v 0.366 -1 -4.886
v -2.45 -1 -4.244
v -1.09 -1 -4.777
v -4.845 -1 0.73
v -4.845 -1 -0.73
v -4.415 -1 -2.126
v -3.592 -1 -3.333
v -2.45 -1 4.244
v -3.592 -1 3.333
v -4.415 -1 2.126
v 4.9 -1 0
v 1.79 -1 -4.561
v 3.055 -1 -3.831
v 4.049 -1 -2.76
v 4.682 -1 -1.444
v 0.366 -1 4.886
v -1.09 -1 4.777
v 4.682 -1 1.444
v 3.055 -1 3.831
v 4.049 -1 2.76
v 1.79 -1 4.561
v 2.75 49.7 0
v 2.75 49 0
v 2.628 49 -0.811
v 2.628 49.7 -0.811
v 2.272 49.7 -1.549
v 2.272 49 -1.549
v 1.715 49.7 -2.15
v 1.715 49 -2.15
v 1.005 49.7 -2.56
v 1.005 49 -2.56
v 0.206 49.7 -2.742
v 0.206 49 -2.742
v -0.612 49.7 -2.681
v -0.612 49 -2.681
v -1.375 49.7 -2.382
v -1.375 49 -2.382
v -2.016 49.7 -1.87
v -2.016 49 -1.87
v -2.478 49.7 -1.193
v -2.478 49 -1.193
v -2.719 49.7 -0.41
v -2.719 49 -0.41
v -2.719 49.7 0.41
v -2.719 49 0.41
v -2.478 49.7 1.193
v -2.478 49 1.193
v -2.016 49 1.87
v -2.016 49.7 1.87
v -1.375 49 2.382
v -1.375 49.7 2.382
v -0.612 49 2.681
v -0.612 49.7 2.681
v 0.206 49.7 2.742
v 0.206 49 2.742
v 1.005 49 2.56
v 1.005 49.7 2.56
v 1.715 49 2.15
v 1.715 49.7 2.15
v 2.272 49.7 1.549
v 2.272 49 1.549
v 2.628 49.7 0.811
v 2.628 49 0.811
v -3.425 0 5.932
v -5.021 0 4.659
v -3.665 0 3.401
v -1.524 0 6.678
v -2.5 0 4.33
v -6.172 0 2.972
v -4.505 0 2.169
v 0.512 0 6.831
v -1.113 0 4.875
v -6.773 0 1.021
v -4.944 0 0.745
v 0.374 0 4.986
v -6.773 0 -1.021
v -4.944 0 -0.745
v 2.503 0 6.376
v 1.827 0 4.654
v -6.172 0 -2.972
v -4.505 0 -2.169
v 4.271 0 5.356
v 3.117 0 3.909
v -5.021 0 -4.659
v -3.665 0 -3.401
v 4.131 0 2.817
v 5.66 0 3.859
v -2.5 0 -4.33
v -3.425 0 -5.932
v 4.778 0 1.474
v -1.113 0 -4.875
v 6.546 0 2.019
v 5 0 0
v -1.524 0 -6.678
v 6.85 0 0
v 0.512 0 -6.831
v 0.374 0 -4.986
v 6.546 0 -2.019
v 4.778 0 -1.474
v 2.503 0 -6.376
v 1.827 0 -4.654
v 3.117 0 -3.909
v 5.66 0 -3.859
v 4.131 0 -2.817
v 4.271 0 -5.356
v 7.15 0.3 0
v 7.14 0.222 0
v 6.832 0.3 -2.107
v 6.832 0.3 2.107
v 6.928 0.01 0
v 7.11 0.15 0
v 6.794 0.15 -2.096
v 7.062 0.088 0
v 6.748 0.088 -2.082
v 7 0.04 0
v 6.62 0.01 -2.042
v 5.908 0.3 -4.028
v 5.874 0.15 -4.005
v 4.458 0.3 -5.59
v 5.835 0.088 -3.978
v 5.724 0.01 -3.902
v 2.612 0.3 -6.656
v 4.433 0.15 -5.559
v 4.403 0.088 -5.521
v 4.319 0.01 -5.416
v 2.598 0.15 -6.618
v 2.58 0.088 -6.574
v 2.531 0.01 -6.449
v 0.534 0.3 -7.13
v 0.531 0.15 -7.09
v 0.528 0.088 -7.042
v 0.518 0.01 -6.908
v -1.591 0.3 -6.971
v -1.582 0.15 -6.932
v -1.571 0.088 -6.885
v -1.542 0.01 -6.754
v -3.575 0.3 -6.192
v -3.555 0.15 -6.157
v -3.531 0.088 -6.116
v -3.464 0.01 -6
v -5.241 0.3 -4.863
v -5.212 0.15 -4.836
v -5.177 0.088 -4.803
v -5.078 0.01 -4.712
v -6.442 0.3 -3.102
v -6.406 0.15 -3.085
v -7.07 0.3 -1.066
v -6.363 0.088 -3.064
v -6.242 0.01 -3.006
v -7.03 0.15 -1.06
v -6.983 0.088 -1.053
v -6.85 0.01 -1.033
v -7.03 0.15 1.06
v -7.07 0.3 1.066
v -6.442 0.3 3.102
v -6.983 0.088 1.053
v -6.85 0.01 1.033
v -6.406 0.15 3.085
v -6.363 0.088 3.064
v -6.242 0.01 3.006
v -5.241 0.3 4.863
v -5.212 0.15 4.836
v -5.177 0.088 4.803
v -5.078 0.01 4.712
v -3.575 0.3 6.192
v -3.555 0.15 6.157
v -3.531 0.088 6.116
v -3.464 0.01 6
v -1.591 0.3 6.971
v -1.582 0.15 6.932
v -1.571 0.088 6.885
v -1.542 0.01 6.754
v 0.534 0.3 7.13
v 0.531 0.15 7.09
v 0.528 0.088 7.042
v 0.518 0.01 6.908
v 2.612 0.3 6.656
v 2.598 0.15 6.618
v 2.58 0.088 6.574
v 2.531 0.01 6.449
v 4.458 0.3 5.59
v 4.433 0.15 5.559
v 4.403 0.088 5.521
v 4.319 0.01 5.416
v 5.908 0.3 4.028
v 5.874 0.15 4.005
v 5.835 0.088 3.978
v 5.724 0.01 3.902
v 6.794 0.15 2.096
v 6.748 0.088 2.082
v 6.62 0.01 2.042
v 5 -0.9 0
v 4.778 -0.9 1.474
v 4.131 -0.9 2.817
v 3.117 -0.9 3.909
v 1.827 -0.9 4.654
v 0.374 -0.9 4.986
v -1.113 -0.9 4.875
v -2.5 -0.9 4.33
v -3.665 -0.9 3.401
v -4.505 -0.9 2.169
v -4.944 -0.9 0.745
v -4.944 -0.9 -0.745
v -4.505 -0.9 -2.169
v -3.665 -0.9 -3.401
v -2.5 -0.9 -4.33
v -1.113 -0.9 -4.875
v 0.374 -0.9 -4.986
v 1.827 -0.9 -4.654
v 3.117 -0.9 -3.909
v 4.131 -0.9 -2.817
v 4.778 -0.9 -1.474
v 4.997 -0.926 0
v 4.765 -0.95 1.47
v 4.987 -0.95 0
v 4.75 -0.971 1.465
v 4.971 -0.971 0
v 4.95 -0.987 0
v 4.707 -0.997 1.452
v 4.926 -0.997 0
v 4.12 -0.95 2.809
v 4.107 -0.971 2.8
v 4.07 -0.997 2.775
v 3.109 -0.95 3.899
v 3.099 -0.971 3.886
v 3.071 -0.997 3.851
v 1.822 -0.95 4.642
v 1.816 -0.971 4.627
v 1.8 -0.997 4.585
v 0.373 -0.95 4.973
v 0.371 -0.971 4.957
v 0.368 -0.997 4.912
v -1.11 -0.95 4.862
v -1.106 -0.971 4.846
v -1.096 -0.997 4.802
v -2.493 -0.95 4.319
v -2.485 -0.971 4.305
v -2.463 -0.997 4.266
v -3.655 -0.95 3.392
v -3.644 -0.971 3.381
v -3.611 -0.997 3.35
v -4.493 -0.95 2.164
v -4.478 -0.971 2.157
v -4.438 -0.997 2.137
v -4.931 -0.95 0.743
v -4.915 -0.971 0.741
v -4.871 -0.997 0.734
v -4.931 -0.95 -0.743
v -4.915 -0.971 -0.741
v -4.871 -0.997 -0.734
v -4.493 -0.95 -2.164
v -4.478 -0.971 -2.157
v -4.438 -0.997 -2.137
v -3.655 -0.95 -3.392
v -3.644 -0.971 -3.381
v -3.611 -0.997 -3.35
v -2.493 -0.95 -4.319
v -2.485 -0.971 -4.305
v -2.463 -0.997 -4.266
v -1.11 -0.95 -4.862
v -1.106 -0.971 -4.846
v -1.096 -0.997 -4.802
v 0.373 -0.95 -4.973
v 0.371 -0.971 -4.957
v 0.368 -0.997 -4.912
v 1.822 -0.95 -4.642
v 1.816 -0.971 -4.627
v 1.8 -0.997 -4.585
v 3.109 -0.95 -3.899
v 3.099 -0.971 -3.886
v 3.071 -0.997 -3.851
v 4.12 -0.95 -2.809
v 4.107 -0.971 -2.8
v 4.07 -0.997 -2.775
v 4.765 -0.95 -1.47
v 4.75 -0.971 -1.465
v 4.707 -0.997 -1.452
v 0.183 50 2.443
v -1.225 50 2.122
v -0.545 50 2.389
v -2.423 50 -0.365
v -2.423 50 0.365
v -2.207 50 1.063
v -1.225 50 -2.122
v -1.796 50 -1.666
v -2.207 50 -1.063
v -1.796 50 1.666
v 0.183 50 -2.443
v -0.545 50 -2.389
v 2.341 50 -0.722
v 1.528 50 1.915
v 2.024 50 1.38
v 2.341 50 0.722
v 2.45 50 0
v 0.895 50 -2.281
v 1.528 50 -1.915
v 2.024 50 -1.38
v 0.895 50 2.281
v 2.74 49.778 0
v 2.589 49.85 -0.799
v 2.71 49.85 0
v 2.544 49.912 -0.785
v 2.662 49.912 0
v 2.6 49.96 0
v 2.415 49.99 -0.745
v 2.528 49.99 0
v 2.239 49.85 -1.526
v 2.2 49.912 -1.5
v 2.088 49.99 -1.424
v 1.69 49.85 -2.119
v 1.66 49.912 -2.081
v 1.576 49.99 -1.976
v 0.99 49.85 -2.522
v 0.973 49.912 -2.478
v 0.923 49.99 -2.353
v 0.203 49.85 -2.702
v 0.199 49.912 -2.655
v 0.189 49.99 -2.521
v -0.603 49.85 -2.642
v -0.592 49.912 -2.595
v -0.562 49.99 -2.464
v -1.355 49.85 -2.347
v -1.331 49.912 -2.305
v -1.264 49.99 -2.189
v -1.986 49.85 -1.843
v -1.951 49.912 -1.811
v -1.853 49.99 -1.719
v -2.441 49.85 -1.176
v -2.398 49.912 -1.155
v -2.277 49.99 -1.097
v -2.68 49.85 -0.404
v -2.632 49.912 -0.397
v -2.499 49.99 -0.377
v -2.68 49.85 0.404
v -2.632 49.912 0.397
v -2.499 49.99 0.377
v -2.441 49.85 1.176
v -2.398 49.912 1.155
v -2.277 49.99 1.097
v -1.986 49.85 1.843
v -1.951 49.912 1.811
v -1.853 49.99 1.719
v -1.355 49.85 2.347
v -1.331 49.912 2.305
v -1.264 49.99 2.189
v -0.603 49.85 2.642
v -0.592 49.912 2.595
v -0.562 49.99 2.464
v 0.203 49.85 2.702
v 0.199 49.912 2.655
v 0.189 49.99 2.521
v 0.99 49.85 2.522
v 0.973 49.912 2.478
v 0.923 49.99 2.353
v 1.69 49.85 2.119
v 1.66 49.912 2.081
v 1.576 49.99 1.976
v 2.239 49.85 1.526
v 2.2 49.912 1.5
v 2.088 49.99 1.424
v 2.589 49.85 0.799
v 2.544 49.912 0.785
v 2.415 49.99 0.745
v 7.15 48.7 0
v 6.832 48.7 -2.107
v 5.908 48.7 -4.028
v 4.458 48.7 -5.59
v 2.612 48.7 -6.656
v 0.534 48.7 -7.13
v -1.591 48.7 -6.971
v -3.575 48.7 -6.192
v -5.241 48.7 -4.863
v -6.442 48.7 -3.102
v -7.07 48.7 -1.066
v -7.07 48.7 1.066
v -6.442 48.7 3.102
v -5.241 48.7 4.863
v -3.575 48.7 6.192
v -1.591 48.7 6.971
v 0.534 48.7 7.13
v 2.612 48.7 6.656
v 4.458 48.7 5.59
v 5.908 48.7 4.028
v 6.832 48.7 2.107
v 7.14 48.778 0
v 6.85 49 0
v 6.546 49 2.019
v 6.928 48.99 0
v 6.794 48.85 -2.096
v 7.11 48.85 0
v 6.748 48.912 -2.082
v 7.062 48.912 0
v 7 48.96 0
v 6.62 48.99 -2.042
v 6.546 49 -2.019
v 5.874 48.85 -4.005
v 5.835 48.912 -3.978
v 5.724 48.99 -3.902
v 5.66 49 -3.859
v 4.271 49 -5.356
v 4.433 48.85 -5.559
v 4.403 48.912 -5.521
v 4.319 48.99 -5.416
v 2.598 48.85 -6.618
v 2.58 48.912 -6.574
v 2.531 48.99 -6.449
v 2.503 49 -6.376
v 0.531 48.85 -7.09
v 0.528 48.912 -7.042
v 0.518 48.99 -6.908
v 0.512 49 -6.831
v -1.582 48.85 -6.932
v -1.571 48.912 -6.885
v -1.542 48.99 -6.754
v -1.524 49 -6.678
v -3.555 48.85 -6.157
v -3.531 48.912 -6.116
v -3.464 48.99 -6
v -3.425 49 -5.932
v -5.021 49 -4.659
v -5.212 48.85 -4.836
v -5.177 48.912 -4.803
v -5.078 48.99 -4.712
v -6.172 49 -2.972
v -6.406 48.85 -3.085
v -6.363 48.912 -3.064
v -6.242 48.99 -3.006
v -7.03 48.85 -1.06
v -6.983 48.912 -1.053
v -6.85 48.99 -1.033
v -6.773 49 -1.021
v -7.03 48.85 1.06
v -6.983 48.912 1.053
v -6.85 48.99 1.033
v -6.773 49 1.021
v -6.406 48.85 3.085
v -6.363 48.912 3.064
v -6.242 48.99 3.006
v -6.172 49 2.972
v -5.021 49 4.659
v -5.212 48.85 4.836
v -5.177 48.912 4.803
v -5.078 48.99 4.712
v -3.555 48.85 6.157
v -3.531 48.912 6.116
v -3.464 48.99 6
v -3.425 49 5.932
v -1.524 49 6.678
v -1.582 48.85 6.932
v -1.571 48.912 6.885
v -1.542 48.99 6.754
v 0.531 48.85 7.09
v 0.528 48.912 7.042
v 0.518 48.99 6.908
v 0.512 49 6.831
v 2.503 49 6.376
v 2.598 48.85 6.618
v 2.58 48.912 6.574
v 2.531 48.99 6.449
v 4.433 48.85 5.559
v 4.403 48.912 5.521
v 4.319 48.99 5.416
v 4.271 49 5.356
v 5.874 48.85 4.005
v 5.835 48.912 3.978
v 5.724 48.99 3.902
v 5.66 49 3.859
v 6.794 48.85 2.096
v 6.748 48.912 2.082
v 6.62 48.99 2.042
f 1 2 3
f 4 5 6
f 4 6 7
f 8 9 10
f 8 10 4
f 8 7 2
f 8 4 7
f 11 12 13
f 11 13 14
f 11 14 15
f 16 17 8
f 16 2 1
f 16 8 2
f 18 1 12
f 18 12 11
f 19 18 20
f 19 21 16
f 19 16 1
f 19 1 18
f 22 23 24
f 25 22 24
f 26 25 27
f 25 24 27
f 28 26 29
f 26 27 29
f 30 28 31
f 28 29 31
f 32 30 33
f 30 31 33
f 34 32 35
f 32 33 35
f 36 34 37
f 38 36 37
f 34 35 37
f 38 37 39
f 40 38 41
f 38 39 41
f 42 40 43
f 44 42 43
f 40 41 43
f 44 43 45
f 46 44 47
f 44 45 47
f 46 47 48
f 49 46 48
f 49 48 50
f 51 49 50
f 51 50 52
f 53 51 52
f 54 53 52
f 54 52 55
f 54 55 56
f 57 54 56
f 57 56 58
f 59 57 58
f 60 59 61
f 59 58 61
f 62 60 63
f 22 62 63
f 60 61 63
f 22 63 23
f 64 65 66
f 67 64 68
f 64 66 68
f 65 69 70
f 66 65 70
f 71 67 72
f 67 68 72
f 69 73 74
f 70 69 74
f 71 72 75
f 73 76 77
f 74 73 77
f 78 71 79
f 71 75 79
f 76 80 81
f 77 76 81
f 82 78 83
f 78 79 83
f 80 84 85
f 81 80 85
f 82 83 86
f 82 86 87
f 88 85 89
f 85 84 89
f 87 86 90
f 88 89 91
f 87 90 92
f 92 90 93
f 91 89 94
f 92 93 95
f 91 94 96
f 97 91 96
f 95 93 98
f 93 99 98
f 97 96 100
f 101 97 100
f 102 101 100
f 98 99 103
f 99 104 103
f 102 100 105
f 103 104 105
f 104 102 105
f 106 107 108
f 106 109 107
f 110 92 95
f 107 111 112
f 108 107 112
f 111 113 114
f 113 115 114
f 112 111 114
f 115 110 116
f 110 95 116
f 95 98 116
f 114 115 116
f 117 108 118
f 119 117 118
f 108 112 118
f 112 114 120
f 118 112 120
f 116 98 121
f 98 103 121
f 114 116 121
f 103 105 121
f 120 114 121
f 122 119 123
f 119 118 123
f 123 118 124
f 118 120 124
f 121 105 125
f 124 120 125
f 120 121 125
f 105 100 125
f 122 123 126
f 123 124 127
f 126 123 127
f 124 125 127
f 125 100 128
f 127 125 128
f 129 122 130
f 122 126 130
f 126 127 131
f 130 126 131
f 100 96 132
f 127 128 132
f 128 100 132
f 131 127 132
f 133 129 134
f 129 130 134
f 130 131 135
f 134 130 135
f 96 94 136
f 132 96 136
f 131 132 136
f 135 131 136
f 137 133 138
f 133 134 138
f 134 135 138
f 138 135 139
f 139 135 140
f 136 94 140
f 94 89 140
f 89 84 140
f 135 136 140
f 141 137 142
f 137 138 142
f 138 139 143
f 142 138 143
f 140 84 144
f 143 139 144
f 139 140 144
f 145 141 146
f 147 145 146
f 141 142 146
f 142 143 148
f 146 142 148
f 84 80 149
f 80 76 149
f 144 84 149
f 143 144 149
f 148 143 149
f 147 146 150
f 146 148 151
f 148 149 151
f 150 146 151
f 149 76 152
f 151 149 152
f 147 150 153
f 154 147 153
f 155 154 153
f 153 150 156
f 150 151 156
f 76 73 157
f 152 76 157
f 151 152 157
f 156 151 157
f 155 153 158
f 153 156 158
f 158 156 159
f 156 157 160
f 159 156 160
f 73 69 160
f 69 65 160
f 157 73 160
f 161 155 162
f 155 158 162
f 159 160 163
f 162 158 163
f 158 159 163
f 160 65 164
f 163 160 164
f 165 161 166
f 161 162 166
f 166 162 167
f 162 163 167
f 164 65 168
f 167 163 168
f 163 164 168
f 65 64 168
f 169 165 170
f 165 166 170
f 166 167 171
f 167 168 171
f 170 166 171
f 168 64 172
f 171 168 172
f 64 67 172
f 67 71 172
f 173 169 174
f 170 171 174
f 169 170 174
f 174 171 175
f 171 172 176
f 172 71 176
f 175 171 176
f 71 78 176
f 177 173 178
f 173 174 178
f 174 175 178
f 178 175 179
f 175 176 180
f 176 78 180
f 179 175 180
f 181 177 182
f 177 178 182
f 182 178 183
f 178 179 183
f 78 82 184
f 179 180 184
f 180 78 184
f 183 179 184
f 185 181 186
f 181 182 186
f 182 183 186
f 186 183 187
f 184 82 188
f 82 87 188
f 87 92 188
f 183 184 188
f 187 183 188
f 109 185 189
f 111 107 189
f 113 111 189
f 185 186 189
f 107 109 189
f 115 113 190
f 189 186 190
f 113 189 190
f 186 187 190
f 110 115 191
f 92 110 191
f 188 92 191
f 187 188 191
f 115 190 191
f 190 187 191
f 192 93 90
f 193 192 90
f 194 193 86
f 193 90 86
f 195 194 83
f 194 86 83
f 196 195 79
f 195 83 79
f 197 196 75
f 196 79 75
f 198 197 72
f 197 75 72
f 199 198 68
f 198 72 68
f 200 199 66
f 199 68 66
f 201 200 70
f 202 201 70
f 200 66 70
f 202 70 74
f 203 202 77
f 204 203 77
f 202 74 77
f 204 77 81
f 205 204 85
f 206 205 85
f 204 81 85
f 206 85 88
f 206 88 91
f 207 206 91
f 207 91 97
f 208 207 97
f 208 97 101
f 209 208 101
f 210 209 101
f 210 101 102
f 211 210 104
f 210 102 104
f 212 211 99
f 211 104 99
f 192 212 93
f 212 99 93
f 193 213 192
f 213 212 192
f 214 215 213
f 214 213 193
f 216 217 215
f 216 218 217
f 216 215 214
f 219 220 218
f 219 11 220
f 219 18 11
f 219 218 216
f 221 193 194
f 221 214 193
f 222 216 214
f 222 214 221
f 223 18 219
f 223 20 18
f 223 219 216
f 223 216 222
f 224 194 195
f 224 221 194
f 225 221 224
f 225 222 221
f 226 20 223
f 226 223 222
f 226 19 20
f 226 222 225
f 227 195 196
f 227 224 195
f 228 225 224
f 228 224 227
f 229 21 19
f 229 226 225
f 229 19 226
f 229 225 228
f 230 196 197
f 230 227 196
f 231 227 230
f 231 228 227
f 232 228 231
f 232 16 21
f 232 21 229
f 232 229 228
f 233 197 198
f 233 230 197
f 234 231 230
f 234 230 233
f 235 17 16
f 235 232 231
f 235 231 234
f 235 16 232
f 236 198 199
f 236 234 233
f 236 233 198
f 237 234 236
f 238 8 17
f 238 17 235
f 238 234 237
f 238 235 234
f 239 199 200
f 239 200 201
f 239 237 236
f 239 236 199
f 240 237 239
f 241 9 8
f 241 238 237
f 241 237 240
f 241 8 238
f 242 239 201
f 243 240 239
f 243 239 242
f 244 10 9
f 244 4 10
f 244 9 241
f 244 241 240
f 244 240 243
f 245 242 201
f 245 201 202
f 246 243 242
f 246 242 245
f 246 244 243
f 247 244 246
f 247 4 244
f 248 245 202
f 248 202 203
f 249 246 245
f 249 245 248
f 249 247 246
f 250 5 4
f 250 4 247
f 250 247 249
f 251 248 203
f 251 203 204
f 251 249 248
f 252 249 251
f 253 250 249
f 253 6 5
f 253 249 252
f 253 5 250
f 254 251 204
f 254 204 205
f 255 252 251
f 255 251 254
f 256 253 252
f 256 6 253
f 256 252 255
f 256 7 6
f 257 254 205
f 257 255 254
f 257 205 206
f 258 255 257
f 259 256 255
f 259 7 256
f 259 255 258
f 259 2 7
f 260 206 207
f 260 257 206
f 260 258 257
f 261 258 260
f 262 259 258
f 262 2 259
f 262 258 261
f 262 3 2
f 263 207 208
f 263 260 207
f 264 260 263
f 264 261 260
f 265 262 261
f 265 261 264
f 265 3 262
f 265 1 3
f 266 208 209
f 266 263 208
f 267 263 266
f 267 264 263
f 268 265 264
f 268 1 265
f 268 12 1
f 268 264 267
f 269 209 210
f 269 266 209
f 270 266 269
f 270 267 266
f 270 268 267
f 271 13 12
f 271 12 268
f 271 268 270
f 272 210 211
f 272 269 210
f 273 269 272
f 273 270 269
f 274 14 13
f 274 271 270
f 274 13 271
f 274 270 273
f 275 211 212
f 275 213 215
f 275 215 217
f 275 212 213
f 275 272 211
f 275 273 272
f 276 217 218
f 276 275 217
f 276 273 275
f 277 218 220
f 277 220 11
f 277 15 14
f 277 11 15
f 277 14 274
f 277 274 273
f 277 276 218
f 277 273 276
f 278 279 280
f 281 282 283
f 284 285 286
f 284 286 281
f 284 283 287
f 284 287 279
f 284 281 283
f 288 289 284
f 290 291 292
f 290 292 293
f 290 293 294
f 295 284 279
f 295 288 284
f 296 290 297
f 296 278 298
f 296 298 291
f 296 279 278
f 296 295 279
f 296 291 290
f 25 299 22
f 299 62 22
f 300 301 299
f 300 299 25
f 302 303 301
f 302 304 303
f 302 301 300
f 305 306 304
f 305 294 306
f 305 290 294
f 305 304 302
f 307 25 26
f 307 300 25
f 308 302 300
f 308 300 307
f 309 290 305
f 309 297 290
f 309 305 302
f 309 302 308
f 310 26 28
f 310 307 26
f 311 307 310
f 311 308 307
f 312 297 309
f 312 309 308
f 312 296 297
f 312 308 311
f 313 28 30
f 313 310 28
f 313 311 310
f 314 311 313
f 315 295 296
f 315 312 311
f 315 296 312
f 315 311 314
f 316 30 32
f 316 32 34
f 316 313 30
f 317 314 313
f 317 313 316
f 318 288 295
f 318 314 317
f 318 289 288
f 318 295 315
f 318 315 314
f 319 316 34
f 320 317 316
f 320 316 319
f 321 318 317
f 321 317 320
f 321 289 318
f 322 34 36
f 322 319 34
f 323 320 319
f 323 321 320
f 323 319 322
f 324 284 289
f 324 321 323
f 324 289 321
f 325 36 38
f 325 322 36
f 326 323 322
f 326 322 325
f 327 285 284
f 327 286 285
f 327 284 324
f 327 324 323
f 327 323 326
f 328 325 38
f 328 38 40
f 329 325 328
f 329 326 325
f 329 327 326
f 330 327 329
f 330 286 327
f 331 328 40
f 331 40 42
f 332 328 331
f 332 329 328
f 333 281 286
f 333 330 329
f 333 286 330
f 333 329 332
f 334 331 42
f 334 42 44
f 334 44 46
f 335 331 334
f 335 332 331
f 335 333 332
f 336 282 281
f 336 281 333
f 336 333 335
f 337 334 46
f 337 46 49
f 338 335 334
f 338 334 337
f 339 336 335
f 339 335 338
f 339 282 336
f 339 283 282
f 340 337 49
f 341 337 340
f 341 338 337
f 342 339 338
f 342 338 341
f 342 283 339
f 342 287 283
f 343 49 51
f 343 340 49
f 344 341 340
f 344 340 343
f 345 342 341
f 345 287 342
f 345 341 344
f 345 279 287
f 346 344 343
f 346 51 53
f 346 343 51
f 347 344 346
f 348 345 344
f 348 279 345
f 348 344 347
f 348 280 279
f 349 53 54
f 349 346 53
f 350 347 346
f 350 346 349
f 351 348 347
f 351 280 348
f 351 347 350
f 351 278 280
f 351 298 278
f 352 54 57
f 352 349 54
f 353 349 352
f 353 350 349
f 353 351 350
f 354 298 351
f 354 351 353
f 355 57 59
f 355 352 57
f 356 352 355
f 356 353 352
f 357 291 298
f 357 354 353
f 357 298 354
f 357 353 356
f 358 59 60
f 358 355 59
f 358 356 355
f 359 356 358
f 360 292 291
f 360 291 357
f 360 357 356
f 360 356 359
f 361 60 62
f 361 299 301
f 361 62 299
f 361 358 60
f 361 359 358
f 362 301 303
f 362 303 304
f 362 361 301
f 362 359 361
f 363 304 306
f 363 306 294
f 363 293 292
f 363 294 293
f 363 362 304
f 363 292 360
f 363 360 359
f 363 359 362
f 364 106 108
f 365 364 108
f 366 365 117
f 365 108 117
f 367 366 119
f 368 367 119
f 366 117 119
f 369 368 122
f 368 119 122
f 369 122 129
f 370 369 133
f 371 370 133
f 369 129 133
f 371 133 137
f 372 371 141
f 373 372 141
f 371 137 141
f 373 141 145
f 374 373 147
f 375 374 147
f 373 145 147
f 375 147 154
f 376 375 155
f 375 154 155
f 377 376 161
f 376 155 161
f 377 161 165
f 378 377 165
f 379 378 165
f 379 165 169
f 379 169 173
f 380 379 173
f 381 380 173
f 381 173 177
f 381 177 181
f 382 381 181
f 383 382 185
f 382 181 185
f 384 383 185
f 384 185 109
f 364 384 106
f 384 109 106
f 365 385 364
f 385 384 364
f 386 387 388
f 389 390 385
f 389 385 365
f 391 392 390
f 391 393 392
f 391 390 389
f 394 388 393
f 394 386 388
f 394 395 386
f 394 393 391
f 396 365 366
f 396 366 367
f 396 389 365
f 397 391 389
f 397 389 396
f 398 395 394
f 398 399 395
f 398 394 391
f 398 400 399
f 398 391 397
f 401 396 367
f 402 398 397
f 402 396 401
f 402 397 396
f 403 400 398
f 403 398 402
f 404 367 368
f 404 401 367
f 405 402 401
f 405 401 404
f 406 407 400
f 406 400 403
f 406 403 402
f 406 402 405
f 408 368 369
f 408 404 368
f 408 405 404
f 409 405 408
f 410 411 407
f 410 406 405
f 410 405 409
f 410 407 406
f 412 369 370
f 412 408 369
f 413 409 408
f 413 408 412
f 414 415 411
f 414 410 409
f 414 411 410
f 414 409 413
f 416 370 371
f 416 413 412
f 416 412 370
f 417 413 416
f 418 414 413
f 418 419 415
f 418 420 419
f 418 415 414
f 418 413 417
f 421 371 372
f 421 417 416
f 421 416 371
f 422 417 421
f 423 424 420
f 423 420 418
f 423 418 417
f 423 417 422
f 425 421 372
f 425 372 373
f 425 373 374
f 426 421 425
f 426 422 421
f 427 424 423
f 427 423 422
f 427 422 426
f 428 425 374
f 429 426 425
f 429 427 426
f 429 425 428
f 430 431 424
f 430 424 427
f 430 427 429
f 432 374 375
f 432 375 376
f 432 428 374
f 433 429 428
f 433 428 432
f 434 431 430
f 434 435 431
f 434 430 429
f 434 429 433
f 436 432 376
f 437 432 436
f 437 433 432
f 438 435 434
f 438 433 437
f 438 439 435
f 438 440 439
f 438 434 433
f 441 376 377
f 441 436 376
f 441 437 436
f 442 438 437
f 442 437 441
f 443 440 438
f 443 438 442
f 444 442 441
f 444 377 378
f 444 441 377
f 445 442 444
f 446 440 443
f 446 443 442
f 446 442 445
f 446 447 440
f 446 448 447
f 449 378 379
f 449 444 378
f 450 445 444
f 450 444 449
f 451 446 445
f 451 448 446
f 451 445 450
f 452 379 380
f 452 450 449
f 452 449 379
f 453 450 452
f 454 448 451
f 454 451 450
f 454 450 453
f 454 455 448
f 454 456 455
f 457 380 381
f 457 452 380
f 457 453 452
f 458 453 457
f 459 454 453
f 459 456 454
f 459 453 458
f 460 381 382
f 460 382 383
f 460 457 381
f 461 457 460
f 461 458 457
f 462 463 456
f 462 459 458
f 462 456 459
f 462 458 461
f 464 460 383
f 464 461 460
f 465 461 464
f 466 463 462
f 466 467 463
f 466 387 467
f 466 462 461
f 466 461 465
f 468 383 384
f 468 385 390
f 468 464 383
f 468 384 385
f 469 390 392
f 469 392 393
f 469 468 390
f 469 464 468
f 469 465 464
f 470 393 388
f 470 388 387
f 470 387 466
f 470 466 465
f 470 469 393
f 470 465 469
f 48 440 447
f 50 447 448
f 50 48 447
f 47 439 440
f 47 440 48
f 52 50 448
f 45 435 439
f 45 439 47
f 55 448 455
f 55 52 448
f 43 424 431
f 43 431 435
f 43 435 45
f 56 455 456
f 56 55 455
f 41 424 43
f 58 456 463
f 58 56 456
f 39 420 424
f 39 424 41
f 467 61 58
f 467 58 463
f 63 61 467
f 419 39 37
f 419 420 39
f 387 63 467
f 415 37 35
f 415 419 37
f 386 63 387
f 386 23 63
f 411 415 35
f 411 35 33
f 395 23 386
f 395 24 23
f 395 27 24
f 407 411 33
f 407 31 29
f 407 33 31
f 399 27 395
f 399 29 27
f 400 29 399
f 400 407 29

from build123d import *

# Parameters (mm, degrees)
SKETCH1_R           = 7.15
BOSS_EXTRUDE1_DEPTH = 49
SKETCH2_R           = 2.75
BOSS_EXTRUDE2_DEPTH = 1
FILLET1_R           = 0.3
SKETCH3_R           = 5
BOSS_EXTRUDE3_DEPTH = 1
FILLET3_R           = 0.1


with BuildPart() as part:
    # Sketch1 → Boss-Extrude1 (new body)
    with BuildSketch(Plane(origin=(0, 0, 0), x_dir=(1, 0, 0), z_dir=(0, 1, 0))):
        Circle(SKETCH1_R)
    extrude(amount=BOSS_EXTRUDE1_DEPTH)

    # Sketch2 → Boss-Extrude2 (add)
    with BuildSketch(Plane(origin=(0, 49, 0), x_dir=(1, 0, 0), z_dir=(0, 1, 0))):
        Circle(SKETCH2_R)
    extrude(amount=BOSS_EXTRUDE2_DEPTH)

    # Fillet1
    fillet1_edges = [part.edges().sort_by_distance(p)[0] for p in [
        (-7.15, 0, 0),
        (-7.15, 49, 0),
        (-2.75, 50, 0),
    ]]
    fillet(fillet1_edges, radius=FILLET1_R)

    # Sketch3 → Boss-Extrude3 (add)
    with BuildSketch(Plane.XZ):
        Circle(SKETCH3_R)
    extrude(amount=BOSS_EXTRUDE3_DEPTH)

    # Fillet3
    fillet3_edges = [part.edges().sort_by_distance(p)[0] for p in [
        (-5, -1, 0),
    ]]
    fillet(fillet3_edges, radius=FILLET3_R)


solid = part.part
